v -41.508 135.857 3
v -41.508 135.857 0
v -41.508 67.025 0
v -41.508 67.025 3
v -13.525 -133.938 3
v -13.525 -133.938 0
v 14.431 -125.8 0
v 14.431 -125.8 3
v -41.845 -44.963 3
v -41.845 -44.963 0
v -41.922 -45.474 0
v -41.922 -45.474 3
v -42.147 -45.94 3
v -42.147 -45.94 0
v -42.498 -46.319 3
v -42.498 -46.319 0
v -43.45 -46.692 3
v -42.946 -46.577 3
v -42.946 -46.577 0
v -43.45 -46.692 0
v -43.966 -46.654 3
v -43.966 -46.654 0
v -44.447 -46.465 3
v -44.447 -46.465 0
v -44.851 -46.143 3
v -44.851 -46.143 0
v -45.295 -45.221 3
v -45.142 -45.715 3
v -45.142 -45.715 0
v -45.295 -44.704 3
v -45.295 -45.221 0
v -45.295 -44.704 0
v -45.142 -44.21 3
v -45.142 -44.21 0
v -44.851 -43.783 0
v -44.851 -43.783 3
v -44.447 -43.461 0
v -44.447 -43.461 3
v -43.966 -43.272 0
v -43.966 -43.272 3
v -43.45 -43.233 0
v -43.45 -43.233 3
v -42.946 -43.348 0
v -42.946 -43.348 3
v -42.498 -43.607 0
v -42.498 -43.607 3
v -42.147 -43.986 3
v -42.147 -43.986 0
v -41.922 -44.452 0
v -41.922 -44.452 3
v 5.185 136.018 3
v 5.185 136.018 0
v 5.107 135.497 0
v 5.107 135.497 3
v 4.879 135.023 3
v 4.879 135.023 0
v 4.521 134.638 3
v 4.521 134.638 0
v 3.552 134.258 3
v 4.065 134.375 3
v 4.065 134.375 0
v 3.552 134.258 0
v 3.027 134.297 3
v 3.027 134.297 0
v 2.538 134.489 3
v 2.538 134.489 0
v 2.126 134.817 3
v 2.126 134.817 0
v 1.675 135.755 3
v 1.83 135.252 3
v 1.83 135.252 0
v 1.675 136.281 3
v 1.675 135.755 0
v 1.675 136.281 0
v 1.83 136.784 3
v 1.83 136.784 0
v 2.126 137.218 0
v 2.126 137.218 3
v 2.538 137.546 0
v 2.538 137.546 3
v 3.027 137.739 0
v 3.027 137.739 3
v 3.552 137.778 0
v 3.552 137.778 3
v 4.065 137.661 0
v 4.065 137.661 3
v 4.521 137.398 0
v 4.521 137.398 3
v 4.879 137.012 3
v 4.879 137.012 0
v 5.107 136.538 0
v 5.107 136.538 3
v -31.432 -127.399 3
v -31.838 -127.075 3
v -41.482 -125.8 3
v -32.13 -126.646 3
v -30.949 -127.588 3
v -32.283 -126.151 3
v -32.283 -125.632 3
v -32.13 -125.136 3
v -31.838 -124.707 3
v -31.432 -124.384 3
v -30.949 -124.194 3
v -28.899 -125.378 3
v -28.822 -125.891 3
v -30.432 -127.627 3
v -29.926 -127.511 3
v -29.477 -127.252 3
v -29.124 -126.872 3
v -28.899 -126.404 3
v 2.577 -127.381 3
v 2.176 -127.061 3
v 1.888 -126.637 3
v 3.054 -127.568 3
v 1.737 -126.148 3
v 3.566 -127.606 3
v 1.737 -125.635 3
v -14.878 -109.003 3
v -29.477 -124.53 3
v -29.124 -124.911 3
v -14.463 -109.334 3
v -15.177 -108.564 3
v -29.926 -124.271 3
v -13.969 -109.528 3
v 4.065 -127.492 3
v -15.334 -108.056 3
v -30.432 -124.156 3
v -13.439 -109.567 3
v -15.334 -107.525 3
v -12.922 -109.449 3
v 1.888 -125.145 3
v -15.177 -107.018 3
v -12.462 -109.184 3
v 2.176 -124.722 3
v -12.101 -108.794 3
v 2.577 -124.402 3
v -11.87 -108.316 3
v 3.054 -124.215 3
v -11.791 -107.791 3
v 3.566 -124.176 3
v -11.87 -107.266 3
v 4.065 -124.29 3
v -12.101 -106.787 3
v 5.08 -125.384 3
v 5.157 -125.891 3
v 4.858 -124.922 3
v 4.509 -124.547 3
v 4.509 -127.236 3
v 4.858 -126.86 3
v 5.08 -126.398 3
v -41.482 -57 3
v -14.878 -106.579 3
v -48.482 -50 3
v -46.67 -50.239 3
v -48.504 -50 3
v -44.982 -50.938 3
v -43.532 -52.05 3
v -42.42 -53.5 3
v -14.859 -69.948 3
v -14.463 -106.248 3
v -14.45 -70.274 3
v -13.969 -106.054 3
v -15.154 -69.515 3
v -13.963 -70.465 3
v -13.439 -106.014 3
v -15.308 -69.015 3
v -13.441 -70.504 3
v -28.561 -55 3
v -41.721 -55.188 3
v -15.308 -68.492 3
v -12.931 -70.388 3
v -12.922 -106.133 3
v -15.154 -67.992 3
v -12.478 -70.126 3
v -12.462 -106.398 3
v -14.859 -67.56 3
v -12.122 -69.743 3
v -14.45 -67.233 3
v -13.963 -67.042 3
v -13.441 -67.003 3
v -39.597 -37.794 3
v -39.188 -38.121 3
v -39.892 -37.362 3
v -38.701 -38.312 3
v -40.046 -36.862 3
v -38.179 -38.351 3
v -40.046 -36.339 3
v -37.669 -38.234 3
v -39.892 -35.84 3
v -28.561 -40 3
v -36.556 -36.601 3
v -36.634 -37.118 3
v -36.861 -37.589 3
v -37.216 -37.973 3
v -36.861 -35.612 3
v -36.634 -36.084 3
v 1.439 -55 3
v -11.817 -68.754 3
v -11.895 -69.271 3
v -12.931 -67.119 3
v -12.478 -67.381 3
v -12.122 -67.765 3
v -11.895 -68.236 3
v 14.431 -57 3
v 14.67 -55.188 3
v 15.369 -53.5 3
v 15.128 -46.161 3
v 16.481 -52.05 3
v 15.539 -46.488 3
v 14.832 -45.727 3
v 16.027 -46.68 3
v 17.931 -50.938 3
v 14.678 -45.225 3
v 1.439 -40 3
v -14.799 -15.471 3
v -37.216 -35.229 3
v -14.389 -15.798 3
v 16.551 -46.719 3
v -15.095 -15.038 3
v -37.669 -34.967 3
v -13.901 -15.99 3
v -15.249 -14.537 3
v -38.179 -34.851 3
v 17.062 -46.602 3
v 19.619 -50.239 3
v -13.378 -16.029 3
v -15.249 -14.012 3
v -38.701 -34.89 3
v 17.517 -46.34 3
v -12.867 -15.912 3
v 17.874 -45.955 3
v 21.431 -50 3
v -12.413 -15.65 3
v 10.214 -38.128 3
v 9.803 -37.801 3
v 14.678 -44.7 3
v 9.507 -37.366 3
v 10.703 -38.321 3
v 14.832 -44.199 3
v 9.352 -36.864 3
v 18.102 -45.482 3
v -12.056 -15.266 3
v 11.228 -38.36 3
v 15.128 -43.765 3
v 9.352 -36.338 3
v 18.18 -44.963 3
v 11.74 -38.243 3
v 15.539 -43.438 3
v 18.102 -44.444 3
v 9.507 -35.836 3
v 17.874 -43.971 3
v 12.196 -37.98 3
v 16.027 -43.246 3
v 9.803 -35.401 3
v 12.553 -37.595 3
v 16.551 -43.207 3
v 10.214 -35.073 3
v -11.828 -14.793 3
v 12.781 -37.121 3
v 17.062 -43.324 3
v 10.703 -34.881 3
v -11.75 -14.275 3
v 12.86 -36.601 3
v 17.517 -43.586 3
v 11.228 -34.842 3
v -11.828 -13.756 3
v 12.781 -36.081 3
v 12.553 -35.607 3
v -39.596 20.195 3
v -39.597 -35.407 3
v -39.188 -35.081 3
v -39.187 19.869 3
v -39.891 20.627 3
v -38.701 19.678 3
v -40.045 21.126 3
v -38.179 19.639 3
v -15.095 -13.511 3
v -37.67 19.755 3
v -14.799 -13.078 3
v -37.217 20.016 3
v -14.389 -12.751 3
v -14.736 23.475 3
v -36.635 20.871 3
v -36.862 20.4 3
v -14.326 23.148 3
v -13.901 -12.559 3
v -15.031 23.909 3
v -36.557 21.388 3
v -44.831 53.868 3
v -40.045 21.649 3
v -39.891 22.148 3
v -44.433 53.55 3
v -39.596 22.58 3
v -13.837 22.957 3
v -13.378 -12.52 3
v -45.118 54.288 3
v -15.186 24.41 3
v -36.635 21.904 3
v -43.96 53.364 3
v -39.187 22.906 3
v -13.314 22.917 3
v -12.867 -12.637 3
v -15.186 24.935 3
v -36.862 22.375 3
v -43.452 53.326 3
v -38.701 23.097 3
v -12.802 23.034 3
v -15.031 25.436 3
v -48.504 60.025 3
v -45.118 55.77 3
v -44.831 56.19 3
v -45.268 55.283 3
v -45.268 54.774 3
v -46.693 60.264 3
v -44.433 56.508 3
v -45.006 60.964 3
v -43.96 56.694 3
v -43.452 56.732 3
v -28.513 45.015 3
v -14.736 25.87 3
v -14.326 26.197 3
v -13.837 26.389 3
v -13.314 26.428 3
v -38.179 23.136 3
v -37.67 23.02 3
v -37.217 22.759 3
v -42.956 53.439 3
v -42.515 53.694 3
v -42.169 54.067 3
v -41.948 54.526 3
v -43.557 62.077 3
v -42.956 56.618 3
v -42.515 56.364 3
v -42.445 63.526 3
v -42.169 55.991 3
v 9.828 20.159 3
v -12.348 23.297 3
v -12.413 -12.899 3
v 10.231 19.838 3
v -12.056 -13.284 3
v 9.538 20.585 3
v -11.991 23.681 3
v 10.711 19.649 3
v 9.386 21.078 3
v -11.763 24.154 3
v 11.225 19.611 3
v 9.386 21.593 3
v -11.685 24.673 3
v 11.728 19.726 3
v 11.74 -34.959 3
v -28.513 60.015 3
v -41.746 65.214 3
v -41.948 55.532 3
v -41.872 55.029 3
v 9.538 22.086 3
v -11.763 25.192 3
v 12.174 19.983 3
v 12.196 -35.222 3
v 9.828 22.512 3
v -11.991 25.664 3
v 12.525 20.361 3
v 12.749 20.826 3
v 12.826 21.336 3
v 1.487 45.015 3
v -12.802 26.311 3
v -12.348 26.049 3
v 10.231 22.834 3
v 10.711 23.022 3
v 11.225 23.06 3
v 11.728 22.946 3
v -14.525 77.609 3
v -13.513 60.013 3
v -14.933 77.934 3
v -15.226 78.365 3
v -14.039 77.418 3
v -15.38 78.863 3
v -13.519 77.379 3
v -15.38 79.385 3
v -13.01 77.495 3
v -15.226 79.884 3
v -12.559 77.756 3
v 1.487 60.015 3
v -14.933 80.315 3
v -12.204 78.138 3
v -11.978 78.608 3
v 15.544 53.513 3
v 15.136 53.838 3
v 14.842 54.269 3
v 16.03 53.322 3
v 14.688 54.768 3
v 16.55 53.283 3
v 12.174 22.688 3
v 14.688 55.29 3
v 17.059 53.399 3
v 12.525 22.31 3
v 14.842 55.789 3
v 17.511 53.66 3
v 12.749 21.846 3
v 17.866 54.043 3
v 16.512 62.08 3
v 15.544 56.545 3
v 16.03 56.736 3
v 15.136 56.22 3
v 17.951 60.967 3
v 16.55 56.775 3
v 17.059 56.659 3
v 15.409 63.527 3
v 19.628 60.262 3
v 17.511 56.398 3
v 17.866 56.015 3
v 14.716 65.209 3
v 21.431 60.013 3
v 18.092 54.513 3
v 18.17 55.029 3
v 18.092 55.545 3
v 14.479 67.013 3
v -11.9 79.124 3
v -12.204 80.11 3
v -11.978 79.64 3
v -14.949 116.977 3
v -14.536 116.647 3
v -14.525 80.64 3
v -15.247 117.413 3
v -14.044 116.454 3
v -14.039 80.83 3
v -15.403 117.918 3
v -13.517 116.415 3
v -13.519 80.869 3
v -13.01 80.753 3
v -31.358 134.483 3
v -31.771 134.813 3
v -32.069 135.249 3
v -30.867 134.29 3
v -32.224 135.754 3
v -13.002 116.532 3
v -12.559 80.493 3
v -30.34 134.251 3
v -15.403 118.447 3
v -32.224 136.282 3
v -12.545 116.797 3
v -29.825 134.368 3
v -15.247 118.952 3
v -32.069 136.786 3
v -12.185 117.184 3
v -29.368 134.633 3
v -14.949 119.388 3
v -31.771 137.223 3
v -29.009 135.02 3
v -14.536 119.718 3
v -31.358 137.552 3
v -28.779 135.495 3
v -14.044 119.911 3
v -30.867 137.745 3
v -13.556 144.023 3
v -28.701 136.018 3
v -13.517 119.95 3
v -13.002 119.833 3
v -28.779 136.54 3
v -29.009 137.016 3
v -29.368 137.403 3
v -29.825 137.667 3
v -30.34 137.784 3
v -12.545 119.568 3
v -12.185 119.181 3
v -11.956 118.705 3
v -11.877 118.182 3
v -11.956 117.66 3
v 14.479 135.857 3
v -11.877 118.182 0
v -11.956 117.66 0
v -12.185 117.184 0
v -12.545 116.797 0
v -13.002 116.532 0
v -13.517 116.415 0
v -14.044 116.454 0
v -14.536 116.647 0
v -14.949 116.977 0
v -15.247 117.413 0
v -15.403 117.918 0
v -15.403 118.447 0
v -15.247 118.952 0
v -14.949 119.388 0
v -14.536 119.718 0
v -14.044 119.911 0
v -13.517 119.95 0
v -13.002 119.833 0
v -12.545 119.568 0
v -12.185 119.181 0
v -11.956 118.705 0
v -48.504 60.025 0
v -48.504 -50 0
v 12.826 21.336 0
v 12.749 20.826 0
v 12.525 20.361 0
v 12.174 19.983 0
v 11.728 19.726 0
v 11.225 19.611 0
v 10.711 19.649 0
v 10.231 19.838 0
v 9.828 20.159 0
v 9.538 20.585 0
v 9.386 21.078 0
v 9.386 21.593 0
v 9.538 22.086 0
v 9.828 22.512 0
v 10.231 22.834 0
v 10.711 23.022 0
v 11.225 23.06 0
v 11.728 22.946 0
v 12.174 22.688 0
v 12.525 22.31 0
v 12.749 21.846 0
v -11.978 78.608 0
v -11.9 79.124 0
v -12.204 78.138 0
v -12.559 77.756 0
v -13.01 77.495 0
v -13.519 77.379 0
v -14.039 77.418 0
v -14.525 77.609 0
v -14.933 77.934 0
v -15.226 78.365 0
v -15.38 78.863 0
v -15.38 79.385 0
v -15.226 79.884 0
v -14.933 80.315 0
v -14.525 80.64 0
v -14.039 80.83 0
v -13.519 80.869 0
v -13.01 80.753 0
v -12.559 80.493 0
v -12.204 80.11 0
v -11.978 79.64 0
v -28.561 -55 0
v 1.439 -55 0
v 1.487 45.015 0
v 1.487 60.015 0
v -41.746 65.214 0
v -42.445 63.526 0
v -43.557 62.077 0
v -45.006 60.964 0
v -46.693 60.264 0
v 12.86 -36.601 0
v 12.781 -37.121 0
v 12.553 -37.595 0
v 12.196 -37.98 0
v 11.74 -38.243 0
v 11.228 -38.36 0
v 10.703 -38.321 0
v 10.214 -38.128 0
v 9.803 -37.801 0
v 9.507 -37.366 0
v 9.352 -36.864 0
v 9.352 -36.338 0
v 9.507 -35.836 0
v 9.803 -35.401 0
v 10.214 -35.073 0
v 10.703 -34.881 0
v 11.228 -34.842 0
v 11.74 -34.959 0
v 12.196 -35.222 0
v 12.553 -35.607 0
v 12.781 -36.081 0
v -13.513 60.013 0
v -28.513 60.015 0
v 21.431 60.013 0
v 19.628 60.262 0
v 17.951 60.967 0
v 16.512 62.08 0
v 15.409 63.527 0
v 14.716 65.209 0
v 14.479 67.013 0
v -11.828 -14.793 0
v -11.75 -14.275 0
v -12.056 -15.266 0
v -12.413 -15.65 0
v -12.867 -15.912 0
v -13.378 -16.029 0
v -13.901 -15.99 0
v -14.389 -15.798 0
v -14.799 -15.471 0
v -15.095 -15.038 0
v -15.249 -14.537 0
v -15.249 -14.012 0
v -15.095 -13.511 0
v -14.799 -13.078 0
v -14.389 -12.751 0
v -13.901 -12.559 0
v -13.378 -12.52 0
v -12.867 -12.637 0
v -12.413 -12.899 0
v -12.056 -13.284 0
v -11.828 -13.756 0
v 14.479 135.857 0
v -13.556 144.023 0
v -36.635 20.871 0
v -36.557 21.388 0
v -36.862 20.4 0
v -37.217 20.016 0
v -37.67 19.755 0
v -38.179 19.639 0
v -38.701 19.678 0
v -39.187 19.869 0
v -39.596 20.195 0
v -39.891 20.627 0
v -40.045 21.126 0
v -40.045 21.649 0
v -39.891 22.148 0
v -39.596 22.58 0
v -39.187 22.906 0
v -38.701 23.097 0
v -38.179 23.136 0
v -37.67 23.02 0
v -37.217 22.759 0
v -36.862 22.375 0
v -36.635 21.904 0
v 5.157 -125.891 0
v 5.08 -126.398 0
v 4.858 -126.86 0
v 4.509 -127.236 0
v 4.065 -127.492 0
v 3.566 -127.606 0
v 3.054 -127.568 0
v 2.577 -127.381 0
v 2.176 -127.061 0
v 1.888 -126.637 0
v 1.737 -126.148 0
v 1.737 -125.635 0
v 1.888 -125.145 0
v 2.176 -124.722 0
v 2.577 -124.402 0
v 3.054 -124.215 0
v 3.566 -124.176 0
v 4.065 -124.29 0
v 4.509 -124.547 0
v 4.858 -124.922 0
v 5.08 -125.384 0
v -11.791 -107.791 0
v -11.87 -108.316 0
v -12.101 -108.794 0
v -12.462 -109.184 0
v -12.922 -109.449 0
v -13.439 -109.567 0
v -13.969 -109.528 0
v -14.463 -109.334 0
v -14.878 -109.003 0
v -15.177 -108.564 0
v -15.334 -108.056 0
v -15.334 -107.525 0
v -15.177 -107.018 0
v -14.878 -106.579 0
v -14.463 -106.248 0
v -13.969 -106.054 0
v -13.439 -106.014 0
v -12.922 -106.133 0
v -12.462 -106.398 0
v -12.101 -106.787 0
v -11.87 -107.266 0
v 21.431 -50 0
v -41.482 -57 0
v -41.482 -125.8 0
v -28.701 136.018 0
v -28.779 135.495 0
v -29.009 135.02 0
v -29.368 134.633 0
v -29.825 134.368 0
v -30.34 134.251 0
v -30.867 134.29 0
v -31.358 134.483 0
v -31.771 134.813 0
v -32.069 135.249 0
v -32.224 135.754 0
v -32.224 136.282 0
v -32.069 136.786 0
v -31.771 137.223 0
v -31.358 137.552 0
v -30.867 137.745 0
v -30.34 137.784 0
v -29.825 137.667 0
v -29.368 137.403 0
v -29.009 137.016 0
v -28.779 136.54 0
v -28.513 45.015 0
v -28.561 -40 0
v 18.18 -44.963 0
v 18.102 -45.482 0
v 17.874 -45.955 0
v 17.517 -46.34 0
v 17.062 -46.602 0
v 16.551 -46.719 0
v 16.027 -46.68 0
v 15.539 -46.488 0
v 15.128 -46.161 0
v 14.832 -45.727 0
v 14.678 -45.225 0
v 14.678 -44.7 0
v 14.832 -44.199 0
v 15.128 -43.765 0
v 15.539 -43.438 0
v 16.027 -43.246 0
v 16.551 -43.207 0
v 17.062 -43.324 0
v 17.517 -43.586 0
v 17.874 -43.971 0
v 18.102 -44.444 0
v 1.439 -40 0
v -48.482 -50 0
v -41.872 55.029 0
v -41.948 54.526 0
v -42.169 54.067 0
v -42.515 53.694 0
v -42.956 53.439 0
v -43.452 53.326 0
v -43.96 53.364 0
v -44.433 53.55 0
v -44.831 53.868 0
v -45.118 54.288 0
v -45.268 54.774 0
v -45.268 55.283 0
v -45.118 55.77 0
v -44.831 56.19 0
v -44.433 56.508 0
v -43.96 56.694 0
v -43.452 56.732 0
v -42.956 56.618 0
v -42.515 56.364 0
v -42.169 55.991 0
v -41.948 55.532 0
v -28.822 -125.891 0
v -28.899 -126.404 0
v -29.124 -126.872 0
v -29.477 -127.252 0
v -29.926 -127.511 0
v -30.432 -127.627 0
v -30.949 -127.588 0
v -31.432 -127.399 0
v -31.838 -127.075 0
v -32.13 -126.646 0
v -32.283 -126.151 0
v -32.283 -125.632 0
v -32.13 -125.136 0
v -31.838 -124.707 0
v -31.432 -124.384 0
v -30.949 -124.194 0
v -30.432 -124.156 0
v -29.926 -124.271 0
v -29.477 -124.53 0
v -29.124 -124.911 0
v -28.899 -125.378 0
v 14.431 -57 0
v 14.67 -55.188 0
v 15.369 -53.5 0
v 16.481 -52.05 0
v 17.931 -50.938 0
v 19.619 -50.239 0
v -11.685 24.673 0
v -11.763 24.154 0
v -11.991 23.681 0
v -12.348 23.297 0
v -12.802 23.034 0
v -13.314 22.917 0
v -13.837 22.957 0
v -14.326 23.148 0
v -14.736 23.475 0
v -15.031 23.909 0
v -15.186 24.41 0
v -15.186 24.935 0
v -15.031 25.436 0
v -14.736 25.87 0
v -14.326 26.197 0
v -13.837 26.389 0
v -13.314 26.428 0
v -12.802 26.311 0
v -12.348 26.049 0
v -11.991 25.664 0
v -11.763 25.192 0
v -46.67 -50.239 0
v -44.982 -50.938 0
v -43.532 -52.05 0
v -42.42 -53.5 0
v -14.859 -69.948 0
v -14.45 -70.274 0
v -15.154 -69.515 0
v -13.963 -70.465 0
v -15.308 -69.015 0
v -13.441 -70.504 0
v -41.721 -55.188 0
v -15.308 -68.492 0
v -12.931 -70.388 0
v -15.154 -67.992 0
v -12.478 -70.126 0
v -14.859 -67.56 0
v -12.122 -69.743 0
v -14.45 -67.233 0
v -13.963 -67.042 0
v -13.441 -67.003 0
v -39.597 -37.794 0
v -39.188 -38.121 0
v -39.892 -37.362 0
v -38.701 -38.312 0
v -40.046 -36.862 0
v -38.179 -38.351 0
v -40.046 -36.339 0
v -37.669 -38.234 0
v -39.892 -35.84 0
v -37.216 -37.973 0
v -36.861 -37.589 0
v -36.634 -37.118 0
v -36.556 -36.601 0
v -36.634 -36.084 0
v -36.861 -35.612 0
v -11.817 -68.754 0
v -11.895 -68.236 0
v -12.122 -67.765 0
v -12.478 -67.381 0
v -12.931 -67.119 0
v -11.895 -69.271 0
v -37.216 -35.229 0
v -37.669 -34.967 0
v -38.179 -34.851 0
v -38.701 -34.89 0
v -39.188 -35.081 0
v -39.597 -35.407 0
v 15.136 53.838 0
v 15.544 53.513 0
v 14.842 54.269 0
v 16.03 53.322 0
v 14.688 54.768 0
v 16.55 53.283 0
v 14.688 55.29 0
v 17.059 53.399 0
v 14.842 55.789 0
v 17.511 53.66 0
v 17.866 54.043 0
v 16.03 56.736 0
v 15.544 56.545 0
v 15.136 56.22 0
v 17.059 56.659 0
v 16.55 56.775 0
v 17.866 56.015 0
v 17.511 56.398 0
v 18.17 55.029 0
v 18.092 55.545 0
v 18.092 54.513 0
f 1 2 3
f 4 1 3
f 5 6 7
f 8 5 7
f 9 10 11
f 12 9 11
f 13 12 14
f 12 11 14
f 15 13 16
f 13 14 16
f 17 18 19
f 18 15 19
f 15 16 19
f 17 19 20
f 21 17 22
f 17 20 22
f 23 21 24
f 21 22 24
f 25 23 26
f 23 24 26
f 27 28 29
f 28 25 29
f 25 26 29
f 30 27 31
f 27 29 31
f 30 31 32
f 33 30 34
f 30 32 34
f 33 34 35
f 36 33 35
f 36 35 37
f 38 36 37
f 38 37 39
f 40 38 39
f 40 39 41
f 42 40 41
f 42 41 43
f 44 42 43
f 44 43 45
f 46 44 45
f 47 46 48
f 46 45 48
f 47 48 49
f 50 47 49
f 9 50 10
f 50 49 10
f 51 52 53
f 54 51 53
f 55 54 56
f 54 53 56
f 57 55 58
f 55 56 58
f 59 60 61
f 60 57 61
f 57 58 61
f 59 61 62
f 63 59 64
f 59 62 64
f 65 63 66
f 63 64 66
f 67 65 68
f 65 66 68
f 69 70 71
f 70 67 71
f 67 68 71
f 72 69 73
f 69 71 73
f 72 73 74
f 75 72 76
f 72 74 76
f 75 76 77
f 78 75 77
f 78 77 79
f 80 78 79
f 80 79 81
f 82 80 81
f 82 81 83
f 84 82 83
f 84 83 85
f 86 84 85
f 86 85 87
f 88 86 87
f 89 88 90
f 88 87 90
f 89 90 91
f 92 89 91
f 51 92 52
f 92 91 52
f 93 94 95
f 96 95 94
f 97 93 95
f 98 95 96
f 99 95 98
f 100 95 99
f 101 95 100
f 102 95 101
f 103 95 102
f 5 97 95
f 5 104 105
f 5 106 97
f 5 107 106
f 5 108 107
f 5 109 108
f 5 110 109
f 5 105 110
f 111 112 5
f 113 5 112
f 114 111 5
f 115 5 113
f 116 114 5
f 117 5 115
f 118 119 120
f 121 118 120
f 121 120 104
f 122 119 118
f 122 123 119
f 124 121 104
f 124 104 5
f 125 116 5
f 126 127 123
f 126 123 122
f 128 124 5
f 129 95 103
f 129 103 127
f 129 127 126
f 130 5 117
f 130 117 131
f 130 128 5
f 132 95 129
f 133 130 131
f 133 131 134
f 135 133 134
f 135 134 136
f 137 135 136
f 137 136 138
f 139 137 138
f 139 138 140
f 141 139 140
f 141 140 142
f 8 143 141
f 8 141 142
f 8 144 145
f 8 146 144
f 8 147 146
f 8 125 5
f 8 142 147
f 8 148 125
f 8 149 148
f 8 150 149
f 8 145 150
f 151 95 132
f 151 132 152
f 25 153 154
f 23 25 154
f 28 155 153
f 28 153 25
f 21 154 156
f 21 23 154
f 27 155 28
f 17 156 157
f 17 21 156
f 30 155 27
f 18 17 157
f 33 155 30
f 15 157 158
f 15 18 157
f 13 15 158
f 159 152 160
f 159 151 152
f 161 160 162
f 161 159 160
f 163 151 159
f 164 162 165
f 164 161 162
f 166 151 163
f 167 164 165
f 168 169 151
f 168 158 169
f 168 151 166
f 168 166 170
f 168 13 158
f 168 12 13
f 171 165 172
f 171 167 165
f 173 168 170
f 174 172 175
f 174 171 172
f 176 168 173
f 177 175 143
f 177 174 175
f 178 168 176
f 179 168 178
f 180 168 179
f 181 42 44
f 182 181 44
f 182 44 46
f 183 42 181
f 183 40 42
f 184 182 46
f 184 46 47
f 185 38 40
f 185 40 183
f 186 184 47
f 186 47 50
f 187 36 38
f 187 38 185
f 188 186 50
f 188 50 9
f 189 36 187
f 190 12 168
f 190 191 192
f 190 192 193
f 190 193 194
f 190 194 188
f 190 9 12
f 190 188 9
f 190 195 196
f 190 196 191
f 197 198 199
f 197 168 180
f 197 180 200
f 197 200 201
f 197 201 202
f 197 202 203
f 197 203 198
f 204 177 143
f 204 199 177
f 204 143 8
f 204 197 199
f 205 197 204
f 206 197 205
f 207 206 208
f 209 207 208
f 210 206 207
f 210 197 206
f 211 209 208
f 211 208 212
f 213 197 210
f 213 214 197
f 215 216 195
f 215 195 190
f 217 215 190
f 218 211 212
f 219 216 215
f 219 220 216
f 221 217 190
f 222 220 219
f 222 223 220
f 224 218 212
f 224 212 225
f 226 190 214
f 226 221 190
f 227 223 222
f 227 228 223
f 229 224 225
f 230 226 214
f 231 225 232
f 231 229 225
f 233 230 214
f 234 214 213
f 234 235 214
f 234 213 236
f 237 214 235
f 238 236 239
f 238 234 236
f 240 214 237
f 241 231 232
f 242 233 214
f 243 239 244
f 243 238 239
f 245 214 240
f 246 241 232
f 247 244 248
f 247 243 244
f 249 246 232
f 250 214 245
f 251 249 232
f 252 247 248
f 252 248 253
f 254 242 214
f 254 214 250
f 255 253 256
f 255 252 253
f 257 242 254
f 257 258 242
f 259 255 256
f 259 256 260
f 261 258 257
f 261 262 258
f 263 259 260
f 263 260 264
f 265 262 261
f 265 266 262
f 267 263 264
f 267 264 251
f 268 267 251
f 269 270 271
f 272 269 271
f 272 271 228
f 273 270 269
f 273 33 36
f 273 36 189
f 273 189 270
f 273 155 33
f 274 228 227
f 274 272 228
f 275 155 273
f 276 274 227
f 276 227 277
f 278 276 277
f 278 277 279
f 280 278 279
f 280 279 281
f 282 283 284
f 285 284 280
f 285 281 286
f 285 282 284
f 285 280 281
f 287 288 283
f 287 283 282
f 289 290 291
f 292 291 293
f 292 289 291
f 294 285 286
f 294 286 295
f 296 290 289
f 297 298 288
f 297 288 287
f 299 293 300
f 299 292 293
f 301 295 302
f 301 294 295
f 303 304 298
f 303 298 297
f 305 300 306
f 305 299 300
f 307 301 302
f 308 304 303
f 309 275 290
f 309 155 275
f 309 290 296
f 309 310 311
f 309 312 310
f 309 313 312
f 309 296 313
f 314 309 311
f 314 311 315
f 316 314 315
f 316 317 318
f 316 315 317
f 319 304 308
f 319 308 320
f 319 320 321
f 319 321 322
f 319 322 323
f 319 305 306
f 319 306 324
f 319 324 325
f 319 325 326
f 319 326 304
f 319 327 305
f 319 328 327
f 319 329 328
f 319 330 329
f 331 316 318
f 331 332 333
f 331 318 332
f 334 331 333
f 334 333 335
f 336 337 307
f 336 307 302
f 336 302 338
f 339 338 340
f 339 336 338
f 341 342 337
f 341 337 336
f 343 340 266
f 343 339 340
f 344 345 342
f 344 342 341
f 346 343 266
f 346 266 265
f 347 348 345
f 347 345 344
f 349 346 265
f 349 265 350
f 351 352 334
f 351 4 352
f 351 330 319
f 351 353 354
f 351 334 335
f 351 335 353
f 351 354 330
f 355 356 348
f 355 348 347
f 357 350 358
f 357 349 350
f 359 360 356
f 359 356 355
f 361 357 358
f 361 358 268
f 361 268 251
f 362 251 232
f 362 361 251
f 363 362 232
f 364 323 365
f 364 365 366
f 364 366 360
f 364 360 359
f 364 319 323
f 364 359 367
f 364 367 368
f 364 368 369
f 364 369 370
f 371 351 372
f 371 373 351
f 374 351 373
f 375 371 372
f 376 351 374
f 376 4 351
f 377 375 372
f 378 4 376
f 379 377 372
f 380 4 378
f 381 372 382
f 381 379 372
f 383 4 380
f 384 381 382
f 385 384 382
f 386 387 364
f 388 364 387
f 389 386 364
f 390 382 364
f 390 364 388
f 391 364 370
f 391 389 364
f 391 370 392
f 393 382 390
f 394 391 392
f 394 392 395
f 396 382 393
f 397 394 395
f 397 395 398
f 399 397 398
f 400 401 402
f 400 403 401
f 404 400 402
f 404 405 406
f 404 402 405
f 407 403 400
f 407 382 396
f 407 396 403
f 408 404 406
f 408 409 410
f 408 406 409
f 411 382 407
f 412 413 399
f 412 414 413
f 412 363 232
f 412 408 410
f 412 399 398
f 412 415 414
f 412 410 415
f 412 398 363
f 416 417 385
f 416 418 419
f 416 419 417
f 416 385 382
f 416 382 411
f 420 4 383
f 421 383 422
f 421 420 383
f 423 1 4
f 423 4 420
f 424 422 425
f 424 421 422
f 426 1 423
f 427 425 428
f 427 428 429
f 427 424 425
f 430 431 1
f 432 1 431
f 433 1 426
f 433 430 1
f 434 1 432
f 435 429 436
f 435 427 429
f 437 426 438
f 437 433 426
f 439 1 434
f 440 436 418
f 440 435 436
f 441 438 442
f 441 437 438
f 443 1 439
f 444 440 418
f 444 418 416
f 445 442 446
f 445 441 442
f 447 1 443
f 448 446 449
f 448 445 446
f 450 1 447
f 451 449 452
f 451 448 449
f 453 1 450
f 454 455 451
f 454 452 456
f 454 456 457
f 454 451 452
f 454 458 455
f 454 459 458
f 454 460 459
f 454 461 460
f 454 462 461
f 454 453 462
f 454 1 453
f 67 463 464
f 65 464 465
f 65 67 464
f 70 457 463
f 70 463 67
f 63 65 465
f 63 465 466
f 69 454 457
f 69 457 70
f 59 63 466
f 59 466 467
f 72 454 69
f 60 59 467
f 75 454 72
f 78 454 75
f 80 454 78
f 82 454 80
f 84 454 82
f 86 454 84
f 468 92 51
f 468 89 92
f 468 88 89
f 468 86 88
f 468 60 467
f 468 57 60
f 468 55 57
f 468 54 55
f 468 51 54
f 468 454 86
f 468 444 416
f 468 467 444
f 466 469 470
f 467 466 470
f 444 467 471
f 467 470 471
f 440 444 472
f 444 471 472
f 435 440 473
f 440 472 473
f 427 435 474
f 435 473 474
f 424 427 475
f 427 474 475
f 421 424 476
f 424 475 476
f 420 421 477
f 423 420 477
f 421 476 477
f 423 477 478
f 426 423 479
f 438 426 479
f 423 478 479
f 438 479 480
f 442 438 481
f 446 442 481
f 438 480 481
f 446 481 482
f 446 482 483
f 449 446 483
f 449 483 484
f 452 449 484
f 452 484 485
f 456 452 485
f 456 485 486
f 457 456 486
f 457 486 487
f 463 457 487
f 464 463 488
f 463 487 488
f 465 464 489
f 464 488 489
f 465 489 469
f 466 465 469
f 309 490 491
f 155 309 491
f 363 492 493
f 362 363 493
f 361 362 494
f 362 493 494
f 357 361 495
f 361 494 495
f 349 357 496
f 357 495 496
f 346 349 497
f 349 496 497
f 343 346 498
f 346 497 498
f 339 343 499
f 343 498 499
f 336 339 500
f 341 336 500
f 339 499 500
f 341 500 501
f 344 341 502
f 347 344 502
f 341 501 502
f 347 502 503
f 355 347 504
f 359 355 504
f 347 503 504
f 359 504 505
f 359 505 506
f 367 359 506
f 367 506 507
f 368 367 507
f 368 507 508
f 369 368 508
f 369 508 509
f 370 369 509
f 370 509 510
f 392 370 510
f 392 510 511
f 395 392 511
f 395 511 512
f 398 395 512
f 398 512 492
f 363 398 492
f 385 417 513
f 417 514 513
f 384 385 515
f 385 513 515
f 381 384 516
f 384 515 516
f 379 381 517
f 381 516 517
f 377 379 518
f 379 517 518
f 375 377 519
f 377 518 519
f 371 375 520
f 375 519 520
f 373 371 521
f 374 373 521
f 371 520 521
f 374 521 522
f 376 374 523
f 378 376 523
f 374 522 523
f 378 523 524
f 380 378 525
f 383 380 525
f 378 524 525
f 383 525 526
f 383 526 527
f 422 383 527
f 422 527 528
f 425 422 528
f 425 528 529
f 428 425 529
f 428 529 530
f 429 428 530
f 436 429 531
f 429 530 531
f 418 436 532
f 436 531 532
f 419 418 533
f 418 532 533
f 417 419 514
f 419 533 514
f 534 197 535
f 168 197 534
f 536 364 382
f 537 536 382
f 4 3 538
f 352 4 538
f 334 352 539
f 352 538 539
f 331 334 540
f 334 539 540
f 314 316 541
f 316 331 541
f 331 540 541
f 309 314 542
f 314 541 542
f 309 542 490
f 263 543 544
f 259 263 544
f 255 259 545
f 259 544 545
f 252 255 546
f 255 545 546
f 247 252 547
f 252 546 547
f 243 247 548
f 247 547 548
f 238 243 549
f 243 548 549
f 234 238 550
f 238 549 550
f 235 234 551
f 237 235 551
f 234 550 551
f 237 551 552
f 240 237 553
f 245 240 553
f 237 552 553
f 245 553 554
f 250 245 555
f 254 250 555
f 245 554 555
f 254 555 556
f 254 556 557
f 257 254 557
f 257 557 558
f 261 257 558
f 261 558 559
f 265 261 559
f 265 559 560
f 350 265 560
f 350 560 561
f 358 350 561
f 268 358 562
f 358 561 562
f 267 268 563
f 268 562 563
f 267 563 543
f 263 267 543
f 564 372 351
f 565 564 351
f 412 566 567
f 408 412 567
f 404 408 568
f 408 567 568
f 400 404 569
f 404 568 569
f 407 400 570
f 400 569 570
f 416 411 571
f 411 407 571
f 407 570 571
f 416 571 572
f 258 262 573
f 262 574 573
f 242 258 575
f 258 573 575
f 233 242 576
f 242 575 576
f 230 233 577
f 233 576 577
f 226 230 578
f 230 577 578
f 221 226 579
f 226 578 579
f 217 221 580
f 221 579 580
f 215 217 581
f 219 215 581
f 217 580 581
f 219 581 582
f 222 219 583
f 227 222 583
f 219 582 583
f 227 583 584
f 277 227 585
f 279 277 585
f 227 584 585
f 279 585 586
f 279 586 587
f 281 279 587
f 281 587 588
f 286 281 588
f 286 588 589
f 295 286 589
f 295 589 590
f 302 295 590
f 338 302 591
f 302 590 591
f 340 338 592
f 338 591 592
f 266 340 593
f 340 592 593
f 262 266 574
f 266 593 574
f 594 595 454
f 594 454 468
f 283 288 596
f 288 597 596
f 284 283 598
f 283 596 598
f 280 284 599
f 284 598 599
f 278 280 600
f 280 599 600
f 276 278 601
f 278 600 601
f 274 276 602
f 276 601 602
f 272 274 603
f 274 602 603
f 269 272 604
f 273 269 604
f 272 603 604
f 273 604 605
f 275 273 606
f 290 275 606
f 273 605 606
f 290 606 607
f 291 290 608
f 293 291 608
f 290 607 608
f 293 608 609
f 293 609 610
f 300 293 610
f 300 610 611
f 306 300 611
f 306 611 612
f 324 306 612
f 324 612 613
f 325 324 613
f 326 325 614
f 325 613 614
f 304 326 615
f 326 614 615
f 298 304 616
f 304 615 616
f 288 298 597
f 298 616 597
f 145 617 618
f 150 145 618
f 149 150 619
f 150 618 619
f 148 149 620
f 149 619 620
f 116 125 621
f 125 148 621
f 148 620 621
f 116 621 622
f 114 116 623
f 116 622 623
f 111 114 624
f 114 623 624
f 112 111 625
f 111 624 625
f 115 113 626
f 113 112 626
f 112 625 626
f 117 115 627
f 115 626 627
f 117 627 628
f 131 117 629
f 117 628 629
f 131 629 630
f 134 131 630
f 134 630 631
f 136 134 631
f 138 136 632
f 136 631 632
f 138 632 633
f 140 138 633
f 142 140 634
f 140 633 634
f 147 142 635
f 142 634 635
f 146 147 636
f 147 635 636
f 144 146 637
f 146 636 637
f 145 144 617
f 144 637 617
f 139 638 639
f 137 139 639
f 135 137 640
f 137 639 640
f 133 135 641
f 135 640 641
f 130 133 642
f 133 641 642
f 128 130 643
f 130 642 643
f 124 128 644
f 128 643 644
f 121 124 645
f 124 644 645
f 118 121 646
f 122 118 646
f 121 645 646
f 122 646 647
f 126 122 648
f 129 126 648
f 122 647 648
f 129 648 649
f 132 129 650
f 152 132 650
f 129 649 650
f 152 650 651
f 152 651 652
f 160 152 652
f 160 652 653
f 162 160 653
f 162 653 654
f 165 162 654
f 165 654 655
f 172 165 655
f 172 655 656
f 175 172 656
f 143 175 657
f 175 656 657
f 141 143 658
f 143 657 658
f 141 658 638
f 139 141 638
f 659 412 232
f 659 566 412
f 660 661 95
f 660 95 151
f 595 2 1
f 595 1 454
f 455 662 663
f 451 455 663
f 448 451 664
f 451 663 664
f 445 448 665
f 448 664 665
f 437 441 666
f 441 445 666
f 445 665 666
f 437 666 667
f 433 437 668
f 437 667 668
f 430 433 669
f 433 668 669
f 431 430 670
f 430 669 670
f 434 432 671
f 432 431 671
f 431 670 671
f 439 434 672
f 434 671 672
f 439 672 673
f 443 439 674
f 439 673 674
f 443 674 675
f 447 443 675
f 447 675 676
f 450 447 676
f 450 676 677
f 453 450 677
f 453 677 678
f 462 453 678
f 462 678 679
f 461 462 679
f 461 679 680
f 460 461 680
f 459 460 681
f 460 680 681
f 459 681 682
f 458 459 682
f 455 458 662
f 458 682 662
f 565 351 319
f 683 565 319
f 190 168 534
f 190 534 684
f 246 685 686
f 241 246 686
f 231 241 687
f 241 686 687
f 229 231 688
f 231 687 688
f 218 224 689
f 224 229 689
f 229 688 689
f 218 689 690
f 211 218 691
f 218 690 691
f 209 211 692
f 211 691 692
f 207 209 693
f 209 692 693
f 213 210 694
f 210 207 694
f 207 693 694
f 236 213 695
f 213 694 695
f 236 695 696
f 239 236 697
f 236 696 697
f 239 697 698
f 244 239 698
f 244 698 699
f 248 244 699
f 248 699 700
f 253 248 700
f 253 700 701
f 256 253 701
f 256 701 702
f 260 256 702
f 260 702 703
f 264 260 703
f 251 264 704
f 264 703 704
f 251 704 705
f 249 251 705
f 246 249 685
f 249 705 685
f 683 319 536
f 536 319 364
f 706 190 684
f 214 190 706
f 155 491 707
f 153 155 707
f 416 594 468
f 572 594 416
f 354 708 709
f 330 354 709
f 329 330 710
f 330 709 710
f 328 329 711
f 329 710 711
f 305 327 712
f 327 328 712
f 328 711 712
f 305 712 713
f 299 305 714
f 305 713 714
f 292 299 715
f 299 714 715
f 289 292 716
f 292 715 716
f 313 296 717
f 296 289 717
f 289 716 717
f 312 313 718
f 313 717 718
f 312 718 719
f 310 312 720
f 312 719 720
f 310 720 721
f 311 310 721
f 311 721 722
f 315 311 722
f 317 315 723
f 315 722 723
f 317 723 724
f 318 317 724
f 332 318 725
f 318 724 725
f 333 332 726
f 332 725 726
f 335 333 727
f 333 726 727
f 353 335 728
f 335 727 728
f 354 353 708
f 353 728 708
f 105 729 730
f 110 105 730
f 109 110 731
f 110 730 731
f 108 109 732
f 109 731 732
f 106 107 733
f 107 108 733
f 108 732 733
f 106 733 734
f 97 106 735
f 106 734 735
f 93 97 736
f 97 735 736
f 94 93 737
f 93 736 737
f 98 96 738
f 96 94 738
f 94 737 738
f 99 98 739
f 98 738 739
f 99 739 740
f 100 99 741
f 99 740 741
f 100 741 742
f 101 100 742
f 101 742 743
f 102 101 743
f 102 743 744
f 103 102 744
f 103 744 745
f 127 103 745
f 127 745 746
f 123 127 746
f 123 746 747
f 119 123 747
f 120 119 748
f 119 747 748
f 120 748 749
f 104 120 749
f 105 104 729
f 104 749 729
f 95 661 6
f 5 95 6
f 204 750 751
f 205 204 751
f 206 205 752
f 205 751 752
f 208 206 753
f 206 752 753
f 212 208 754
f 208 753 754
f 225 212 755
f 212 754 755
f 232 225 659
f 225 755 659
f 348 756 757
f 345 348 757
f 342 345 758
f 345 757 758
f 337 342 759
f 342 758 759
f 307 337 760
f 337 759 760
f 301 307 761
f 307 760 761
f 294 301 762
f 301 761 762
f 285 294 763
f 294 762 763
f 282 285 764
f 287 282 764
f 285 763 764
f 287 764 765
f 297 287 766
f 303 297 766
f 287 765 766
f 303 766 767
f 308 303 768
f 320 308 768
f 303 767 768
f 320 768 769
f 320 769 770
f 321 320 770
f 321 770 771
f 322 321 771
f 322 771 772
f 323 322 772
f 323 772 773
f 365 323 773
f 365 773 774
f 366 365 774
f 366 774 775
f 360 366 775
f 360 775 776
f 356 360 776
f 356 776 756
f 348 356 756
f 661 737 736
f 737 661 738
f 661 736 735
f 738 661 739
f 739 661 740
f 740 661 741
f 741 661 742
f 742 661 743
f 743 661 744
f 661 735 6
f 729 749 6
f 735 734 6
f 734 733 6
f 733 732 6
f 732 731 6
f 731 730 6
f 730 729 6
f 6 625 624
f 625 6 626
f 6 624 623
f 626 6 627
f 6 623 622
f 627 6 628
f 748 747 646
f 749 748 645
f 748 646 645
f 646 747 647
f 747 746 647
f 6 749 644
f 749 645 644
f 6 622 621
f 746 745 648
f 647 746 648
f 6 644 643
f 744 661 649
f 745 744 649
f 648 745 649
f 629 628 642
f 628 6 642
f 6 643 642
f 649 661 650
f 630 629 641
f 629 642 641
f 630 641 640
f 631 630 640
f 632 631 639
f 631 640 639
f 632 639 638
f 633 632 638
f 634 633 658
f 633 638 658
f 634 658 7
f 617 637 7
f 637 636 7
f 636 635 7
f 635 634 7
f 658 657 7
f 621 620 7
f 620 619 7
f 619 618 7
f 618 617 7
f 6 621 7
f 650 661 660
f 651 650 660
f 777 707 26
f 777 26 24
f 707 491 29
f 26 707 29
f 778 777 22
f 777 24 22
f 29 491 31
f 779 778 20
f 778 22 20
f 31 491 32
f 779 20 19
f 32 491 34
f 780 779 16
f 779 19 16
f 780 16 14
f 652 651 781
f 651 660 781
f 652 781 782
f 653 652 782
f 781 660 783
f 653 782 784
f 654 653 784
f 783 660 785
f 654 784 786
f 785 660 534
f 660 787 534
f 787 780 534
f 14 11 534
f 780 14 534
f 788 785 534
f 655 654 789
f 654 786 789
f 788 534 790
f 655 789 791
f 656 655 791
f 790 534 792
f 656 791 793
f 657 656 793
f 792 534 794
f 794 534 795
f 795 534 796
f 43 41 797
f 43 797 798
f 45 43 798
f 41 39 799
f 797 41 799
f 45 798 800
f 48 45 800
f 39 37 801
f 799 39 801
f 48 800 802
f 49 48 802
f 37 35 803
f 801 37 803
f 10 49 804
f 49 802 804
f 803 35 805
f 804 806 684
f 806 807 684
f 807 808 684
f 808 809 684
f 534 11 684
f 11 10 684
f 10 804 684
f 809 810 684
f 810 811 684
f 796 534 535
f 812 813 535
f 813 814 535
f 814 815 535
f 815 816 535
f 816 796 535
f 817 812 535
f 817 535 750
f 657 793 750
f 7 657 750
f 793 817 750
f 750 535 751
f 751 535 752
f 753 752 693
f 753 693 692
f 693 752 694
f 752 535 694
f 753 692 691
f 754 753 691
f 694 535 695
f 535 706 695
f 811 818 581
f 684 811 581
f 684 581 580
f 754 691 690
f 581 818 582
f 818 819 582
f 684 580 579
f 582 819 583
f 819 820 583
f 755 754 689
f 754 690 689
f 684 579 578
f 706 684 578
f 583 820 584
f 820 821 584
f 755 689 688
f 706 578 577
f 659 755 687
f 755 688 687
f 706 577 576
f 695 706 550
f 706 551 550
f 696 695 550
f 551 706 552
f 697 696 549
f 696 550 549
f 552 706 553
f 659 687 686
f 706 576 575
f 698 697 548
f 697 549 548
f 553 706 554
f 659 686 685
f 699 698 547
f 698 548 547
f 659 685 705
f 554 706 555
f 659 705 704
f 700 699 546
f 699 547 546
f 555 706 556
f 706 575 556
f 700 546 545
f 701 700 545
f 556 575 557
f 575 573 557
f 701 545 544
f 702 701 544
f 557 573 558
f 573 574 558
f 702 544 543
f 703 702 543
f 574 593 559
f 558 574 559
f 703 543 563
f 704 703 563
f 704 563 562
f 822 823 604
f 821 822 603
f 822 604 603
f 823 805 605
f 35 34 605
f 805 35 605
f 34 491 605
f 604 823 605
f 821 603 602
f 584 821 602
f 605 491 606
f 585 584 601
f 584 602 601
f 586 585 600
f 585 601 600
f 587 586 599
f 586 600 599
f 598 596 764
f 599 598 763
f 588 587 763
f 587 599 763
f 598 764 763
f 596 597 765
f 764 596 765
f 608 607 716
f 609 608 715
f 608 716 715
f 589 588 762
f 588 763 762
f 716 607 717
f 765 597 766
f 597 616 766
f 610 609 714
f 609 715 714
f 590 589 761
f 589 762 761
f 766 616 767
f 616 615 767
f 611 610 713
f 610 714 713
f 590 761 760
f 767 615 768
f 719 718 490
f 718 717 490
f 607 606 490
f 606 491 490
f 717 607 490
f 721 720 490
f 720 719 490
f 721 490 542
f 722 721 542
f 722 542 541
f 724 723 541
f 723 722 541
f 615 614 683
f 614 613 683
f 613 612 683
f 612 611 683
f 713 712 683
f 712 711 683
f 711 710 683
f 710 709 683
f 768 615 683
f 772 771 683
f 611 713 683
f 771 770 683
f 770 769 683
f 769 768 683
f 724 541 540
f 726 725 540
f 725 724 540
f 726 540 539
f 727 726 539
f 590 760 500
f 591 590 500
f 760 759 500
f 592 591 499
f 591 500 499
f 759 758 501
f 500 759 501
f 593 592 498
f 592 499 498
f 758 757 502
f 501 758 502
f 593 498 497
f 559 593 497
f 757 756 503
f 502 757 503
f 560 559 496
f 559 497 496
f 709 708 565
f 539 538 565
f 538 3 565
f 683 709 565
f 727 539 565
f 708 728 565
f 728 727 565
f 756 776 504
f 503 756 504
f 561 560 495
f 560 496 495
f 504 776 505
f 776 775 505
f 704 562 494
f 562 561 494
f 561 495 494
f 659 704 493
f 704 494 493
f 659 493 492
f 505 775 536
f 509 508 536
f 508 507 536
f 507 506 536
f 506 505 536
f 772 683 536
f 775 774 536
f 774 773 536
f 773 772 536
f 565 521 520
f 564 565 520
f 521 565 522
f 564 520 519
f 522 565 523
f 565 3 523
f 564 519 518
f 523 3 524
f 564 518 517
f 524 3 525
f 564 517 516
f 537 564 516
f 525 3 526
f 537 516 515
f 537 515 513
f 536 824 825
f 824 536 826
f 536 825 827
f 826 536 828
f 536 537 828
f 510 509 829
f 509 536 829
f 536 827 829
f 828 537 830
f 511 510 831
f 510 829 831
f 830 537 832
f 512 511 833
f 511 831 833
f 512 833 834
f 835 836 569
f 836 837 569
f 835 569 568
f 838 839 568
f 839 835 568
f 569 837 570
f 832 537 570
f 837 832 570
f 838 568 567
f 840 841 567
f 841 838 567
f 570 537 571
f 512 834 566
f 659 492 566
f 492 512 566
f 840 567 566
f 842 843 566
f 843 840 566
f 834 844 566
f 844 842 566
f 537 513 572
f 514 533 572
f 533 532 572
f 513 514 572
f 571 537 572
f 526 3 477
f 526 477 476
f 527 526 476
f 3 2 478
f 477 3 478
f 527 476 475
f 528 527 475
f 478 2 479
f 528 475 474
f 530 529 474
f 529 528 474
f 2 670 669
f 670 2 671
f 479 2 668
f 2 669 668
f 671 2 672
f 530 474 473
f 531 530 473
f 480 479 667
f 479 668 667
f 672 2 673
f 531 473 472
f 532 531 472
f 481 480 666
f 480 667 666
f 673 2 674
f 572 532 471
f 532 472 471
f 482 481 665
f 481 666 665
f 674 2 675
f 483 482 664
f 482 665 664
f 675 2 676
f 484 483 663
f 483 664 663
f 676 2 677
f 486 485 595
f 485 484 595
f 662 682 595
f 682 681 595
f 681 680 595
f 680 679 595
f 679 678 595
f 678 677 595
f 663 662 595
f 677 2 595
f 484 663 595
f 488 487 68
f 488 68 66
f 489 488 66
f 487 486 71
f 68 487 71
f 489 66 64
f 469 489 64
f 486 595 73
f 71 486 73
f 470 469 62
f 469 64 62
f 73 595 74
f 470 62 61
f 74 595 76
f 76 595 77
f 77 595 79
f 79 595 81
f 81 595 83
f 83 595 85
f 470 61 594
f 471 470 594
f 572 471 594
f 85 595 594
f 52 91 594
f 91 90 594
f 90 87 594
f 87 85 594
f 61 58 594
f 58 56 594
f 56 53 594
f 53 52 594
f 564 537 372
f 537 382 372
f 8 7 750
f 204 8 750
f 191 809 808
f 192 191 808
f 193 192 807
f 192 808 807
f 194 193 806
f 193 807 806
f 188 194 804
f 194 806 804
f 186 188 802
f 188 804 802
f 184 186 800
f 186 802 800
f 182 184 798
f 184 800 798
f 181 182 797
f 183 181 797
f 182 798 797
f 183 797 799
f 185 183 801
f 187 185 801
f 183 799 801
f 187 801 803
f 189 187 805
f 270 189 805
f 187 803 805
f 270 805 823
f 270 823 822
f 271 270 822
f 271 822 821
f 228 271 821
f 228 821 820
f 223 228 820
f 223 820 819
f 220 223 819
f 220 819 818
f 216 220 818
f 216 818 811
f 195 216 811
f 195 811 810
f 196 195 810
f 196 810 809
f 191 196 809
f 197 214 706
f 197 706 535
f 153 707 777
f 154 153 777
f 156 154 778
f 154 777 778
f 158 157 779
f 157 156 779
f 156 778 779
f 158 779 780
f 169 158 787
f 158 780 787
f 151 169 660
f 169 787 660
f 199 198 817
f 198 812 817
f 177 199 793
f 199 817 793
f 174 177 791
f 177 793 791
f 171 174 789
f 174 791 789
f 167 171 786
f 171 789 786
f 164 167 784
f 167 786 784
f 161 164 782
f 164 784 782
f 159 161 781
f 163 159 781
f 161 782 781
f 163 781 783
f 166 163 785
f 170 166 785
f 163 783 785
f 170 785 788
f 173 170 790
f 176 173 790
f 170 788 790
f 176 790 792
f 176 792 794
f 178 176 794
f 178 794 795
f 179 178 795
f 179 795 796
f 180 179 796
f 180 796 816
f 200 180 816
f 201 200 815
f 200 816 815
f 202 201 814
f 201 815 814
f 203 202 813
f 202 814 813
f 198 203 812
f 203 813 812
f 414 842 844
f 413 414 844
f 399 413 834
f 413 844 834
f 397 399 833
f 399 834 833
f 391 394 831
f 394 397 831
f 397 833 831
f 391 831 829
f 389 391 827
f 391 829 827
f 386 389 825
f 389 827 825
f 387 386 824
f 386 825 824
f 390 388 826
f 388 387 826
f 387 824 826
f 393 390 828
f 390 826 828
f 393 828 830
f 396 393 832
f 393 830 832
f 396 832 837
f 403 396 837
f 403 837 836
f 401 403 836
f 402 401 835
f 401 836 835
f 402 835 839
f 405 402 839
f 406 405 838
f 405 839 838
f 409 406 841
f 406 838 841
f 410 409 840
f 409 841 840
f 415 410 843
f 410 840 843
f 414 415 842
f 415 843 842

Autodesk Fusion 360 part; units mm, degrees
sketch "Skizze1" plane through (0, 0, 0) normal (0, 0, 1) x (1, 0, 0)
  line L0 (-48.5045, 60.0252) -> (-48.5045, -50)
  line L1 (21.4307, 60.0126) -> (21.4307, -50)
  line L2 (-41.5077, 135.8568) -> (-13.5563, 144.0233)
  line L3 (-13.5563, 144.0233) -> (14.4793, 135.8568)
  line L4 (-41.4821, -125.8001) -> (-13.5254, -133.9377)
  line L5 (-13.5254, -133.9377) -> (14.4312, -125.8001)
  line L6 (14.4312, -125.8001) -> (14.4312, -57)
  line L7 (-41.4821, -125.8001) -> (-41.4821, -57)
  line L8 (-41.5077, 135.8568) -> (-41.5077, 66.6867)
  line L9 (14.4793, 135.8568) -> (14.4793, 66.6867)
  circle A0 centre (3.4202, 136.0177) radius 1.7651
  circle A1 centre (-30.4724, 136.0177) radius 1.7717
  circle A2 centre (-30.5621, -125.8912) radius 1.7405
  circle A3 centre (3.437, -125.8912) radius 1.7197
  circle A4 centre (-43.5796, -44.9629) radius 1.7343
  circle A5 centre (16.4191, -44.9629) radius 1.761
  circle A6 centre (-43.5796, 55.0289) radius 1.7075
  circle A7 centre (16.4191, 55.0289) radius 1.7507
  line L10 (21.4307, 60.0126) -> (21.4793, 60.0126)
  line L11 (14.4793, 67.0126) -> (14.4793, 66.6867)
  line L12 (-41.5077, 66.6867) -> (-41.5077, 67.0252)
  line L13 (-48.5077, 60.0252) -> (-48.5045, 60.0252)
  line L14 (-48.5045, -50) -> (-48.4821, -50)
  line L15 (21.4312, -50) -> (21.4307, -50)
  arc A8 (21.4312, -50) -> (14.4312, -57) centre (21.4312, -57) ccw
  arc A9 (-41.4821, -57) -> (-48.4821, -50) centre (-48.4821, -57) ccw
  arc A10 (-48.5077, 60.0252) -> (-41.5077, 67.0252) centre (-48.5077, 67.0252) ccw
  arc A11 (14.4793, 67.0126) -> (21.4793, 60.0126) centre (21.4793, 67.0126) ccw
  dimension "d1" = 7
  dimension "d2" = 7
  dimension "d3" = 7
  dimension "d4" = 7
extrude "Extrusion1" add sketch "Skizze1" along normal blind 3
sketch "Skizze2" plane through (0, 0, 0) normal (0, 0, 1) x (1, 0, 0)
  circle A0 centre (-13.6498, 118.1825) radius 1.7726
  circle A1 centre (-13.6498, 79.1243) radius 1.75
  circle A2 centre (-13.4454, 24.6727) radius 1.7602
  circle A3 centre (-13.5095, -14.2747) radius 1.7594
  circle A4 centre (-38.3105, 21.3875) radius 1.7537
  circle A5 centre (-38.3105, -36.6009) radius 1.7548
  circle A6 centre (11.0959, -36.6009) radius 1.7639
  circle A7 centre (11.0959, 21.3357) radius 1.7296
  circle A8 centre (-13.5725, -68.7537) radius 1.7556
  circle A9 centre (-13.5725, -107.7909) radius 1.7814
  dimension "d7" = 3.5
extrude "Extrusion2" cut sketch "Skizze2" along normal blind 10
sketch "Skizze3" plane through (0, 0, 3) normal (0, 0, 1) x (-1, 0, 0)
  circle A0 centre (13.6498, -118.1825) radius 1.7726
  circle A1 centre (38.3105, -21.3875) radius 1.7537
  circle A2 centre (38.3105, 36.6009) radius 1.7548
  circle A3 centre (13.4454, -24.6727) radius 1.7602
  circle A4 centre (13.5725, 107.7909) radius 1.7814
  circle A5 centre (13.6498, -79.1243) radius 1.75
  circle A6 centre (13.5095, 14.2747) radius 1.7594
  circle A7 centre (-11.0959, 36.6009) radius 1.7639
  circle A8 centre (-11.0959, -21.3357) radius 1.7296
  circle A9 centre (13.5725, 68.7537) radius 1.7556
  circle A10 centre (43.5796, 44.9629) radius 1.7343
  circle A11 centre (30.5621, 125.8912) radius 1.7405
  circle A12 centre (-16.4191, -55.0289) radius 1.7507
  circle A13 centre (-16.4191, 44.9629) radius 1.761
  circle A14 centre (30.4724, -136.0177) radius 1.7717
  circle A15 centre (-3.437, 125.8912) radius 1.7197
  circle A16 centre (-3.4202, -136.0177) radius 1.7651
  circle A17 centre (43.5796, -55.0289) radius 1.7075
  line L0 (41.5077, -135.8568) -> (41.5077, -67.0252)
  arc A18 (48.5045, -60.0252) -> (41.5077, -67.0252) centre (48.5077, -67.0252) ccw
  line L1 (48.5045, -60.0252) -> (48.5045, 50)
  line L2 (48.5045, 50) -> (48.4821, 50)
  arc A19 (41.4821, 57) -> (48.4821, 50) centre (48.4821, 57) ccw
  line L3 (41.4821, 57) -> (41.4821, 125.8001)
  line L4 (41.4821, 125.8001) -> (13.5254, 133.9377)
  line L5 (13.5254, 133.9377) -> (-14.4312, 125.8001)
  line L6 (-14.4312, 125.8001) -> (-14.4312, 57)
  arc A20 (-21.4307, 50) -> (-14.4312, 57) centre (-21.4312, 57) ccw
  line L7 (-21.4307, 50) -> (-21.4307, -60.0126)
  line L8 (-21.4307, -60.0126) -> (-21.4793, -60.0126)
  arc A21 (-14.4793, -67.0126) -> (-21.4793, -60.0126) centre (-21.4793, -67.0126) ccw
  line L9 (-14.4793, -67.0126) -> (-14.4793, -135.8568)
  line L10 (-14.4793, -135.8568) -> (13.5563, -144.0233)
  line L11 (13.5563, -144.0233) -> (41.5077, -135.8568)
  line L12 (48.4821, 50) -> (-21.4307, 50)
  line L13 (48.5045, -60.0252) -> (-21.4793, -60.0126)
  line L14 (-21.4793, -60.0126) -> (13.5127, -60.0126)
  line L15 (-21.4307, 50) -> (13.5257, 50)
  line L16 (-21.4307, 50) -> (13.5613, 50)
  line L17 (13.5127, -60.0126) -> (28.5127, -60.0153)
  line L18 (28.5127, -60.0153) -> (-1.4873, -60.0153)
  line L19 (13.5613, 50) -> (13.5613, 45)
  line L20 (13.5613, 45) -> (28.5613, 45)
  line L21 (28.5613, 45) -> (-1.4387, 45)
  line L22 (-1.4387, 45) -> (-1.4387, 55)
  line L23 (-1.4387, 55) -> (28.5613, 55)
  line L24 (28.5613, 55) -> (28.5613, 45)
  line L25 (-1.4873, -60.0153) -> (28.5127, -60.0153)
  line L26 (28.5127, -60.0153) -> (28.5127, -50.0153)
  line L27 (28.5127, -50.0153) -> (-1.4873, -50.0153)
  line L28 (-1.4873, -50.0153) -> (-1.4873, -60.0153)
  line L29 (-1.4387, 45) -> (28.5613, 45)
  line L30 (28.5613, 45) -> (28.5613, 40)
  line L31 (28.5613, 40) -> (-1.4387, 40)
  line L32 (-1.4387, 40) -> (-1.4387, 45)
  line L33 (-1.4873, -50.0153) -> (28.5127, -50.0153)
  line L34 (28.5127, -50.0153) -> (28.5127, -45.0153)
  line L35 (28.5127, -45.0153) -> (-1.4873, -45.0153)
  line L36 (-1.4873, -45.0153) -> (-1.4873, -50.0153)
  dimension "d10" = 34.992
  dimension "d11" = 34.992
  dimension "d12" = 15
  dimension "d13" = 30
  dimension "d15" = 5
  dimension "d16" = 15
  dimension "d17" = 30
  dimension "d18" = 10
  dimension "d19" = 30
  dimension "d20" = 10
  dimension "d21" = 30
  dimension "d22" = 5
  dimension "d23" = 30
  dimension "d24" = 5
extrude "Extrusion3" cut sketch "Skizze3" against normal blind 10 contours L14 L17 L26 L27 L28 L33 | L27 L33 L34 L35 L36 | L12 L19 L20 L21 L24 L29 | L12 L15 L16 L22 L23 L24 | L12 L15 L16 L19 L21 L22 L29 | L20 L21 L29 L30 L31 L32
